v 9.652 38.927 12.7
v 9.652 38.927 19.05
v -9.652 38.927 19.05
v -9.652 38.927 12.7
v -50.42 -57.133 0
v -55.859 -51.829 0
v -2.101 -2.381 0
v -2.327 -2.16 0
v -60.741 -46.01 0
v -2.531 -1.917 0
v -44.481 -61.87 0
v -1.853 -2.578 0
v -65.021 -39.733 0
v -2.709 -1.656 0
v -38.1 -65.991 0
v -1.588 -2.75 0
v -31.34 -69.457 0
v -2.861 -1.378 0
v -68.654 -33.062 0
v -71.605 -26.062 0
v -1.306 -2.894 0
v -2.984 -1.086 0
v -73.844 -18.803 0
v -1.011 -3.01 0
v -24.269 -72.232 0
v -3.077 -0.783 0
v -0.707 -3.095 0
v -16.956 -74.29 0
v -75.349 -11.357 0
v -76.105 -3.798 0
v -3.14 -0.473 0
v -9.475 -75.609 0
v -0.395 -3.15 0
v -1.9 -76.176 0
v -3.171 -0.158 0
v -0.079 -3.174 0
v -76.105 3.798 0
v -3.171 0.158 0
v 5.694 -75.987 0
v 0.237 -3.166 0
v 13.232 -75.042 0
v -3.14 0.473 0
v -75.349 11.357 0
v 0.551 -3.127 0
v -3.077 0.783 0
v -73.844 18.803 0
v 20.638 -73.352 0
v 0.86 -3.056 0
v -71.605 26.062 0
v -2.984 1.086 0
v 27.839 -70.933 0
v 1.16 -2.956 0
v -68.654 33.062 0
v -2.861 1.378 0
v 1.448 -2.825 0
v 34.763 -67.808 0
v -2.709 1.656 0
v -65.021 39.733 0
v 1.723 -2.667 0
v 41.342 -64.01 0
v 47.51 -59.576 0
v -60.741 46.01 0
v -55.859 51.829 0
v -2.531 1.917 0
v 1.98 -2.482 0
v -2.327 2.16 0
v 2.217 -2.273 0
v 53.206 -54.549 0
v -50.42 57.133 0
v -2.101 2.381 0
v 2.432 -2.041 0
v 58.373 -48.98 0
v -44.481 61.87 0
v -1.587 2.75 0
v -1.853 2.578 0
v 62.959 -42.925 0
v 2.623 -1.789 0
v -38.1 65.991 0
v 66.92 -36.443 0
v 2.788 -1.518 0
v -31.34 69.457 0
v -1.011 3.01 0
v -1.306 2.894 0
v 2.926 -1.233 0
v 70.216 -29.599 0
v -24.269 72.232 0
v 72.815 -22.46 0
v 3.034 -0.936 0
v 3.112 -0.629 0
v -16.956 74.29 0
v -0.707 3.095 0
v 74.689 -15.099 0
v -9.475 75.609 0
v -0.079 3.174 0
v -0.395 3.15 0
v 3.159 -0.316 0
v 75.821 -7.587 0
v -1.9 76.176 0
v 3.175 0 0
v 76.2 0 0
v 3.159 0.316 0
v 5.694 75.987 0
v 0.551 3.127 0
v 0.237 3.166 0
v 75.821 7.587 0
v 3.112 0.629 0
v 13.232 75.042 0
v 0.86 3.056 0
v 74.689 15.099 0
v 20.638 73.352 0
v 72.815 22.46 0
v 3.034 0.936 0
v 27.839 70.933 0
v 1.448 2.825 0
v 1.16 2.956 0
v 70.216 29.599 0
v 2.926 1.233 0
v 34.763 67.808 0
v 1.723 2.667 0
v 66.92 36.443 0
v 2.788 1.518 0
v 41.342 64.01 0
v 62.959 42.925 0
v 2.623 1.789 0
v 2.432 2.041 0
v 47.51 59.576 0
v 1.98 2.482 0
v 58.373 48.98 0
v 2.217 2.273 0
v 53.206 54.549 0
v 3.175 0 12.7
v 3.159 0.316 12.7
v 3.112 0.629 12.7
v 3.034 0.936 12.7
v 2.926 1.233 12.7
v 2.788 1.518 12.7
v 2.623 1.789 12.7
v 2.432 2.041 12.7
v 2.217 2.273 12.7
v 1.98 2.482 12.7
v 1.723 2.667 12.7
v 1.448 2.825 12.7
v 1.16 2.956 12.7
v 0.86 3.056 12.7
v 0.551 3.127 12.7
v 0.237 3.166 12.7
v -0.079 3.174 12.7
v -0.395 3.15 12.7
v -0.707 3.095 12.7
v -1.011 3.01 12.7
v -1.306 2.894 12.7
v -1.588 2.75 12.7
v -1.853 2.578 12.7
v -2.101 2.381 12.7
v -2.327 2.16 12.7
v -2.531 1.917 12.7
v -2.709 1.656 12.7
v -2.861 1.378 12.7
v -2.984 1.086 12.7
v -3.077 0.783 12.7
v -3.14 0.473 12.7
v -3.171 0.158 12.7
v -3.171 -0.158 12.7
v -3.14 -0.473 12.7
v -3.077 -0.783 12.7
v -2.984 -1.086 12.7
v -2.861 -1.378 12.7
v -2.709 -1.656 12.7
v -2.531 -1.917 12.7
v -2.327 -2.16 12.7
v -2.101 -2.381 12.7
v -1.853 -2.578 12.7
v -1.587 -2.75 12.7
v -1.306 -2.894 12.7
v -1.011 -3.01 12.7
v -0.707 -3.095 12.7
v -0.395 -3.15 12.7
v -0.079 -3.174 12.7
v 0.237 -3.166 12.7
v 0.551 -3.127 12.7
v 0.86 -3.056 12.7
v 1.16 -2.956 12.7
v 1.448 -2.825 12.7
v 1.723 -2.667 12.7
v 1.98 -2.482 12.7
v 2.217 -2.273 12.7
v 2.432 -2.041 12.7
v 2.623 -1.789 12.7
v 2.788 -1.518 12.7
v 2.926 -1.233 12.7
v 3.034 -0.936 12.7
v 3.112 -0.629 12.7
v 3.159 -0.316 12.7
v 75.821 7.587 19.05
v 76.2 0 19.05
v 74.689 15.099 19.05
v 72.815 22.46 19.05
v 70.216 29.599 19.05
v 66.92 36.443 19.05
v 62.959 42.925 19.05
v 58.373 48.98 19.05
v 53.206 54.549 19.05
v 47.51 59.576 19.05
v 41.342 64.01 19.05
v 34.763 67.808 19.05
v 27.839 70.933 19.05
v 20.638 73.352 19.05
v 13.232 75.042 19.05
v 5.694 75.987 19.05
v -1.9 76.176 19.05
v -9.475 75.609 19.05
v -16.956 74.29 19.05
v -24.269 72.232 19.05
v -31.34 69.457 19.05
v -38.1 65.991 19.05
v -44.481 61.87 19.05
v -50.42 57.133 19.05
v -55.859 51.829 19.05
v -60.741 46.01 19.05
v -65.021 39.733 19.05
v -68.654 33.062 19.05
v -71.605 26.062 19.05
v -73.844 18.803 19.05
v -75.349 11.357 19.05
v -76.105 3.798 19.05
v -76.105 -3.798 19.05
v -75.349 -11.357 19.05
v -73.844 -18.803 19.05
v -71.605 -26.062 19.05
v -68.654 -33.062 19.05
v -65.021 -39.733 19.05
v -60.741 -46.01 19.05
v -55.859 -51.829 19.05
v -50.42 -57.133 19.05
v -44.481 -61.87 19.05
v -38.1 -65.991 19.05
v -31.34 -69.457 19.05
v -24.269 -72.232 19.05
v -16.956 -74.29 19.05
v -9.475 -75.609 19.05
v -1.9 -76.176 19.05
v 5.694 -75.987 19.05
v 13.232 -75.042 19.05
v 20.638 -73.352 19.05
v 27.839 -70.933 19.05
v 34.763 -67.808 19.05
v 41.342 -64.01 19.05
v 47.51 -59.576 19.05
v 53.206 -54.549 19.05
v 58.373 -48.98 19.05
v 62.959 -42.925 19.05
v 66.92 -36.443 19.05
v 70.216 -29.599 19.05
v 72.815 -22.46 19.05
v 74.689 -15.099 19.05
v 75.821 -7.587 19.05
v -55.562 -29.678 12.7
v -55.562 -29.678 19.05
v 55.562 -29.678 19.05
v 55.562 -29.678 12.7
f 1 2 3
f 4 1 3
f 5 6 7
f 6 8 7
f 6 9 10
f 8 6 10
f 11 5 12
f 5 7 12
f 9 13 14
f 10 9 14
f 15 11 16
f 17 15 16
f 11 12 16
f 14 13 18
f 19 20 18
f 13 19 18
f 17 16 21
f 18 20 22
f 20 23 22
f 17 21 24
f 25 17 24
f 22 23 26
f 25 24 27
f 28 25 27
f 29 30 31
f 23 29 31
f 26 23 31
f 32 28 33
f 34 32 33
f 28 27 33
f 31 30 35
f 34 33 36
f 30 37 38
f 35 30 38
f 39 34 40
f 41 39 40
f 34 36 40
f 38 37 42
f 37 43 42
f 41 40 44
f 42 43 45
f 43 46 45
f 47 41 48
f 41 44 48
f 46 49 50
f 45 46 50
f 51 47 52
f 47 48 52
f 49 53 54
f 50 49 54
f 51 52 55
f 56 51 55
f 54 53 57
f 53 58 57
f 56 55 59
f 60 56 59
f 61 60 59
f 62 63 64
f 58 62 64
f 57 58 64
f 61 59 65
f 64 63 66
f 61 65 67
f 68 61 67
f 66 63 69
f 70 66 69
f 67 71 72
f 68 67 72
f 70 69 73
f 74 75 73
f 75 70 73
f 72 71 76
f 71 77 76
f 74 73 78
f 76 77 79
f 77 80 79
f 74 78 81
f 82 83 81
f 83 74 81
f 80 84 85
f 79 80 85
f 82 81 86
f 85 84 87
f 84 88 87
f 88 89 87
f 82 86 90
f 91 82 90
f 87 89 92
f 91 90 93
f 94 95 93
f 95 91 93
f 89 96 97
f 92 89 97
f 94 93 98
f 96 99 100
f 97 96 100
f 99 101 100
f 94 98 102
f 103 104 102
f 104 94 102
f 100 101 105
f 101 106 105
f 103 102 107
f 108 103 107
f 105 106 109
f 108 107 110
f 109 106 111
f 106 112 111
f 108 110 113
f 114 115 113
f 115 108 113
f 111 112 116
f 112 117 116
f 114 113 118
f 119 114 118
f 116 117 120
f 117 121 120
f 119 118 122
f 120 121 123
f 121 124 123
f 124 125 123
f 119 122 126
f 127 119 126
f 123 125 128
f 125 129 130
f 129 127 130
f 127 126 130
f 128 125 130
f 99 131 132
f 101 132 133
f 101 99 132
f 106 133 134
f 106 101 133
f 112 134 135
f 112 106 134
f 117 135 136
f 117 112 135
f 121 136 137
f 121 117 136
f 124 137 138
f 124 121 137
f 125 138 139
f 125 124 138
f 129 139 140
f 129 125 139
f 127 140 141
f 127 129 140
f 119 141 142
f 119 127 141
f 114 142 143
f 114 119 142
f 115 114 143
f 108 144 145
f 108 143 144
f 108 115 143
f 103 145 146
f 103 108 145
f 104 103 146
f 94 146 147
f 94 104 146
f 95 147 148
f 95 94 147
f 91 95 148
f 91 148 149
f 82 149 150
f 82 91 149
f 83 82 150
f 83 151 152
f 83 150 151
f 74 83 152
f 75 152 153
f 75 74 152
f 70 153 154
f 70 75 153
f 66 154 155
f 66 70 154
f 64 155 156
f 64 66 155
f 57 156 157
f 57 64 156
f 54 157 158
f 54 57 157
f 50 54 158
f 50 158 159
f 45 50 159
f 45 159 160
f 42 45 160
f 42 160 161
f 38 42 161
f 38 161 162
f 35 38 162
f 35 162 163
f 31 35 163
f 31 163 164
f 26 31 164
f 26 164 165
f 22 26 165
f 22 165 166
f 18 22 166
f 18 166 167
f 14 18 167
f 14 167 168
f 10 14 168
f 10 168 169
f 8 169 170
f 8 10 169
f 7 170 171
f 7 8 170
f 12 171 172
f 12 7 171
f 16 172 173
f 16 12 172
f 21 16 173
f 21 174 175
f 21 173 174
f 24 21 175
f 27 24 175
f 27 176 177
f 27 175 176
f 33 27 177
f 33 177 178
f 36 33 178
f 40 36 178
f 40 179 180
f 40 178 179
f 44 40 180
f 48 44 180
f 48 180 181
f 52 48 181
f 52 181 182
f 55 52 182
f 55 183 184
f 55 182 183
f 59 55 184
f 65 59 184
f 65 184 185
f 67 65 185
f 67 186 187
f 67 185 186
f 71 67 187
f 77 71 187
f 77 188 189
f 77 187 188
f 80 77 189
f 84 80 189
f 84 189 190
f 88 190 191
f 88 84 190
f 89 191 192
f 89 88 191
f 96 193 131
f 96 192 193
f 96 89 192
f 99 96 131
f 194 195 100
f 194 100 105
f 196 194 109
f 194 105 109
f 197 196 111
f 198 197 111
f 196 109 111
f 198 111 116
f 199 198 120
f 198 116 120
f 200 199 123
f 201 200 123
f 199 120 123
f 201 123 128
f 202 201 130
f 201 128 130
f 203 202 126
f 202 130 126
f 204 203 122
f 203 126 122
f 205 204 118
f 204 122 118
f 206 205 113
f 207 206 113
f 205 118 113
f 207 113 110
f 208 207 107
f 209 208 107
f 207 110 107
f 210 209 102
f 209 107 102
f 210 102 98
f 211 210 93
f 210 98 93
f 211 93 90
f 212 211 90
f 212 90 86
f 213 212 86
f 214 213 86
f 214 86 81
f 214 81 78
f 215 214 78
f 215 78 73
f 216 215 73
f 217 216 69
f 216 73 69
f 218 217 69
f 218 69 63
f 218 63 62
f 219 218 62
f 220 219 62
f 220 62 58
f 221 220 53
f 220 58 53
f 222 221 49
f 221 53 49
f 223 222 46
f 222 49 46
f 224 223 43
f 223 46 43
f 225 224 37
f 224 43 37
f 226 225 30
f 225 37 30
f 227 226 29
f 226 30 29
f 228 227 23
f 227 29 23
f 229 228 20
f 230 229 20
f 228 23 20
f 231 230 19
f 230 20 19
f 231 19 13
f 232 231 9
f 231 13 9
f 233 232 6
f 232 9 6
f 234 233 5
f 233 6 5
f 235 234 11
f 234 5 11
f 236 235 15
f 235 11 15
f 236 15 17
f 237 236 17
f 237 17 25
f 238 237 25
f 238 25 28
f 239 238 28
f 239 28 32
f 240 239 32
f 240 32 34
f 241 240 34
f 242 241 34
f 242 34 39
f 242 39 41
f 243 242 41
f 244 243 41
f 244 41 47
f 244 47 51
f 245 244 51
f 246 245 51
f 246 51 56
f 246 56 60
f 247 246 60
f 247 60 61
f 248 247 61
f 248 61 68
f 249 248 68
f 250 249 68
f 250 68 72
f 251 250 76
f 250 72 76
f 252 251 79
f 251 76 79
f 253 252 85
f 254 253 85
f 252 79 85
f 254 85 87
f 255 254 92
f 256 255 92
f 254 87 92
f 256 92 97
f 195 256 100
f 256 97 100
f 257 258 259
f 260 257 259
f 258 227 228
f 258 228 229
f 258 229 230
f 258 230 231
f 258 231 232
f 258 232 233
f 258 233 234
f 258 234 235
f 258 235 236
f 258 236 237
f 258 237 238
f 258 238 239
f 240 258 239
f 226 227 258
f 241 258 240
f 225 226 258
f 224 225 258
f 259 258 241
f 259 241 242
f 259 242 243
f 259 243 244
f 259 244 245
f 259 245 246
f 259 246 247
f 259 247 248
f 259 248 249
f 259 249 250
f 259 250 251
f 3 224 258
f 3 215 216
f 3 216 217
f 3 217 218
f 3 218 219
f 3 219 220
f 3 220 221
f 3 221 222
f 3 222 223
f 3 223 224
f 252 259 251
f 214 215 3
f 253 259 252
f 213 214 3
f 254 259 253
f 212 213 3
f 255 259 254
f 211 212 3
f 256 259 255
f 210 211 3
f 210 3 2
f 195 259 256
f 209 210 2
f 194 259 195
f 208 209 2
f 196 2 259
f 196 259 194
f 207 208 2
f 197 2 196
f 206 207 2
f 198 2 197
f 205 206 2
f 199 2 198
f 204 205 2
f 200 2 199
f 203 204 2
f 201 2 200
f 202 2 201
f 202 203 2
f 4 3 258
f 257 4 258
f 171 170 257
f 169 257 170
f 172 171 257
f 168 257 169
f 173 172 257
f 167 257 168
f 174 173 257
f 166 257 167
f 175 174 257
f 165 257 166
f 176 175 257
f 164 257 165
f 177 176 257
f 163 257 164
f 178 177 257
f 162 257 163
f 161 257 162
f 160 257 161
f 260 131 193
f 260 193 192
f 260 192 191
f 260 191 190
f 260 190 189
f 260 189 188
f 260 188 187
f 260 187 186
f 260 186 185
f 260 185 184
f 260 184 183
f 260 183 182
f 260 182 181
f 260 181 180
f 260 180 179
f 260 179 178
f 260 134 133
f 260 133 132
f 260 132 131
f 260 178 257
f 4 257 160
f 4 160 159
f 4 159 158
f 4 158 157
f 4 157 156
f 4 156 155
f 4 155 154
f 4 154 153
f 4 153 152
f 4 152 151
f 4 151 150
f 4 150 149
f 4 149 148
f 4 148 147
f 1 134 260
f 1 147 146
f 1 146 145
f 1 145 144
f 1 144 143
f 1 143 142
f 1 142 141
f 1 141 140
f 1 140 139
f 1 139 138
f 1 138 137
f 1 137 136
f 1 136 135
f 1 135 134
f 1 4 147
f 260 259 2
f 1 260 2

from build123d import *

# Parameters (mm, degrees)
F0_R     = 76.2
F0_R_2   = 3.175
F1_DEPTH = 19.05
F3_DEPTH = 6.35


with BuildPart() as f1:
    # F0 (on Top) → F1 (new body)
    with BuildSketch(Plane.XY):
        Circle(F0_R)
        Circle(F0_R_2, mode=Mode.SUBTRACT)
    extrude(amount=F1_DEPTH)

    # F2 (on face) → F3 (cut)
    with BuildSketch(Plane.XY.offset(19.05)):
        Polygon((9.652, 38.927315), (-9.652, 38.927315), (-55.5625, -29.678286), (55.5625, -29.678286), align=None)
    extrude(amount=-F3_DEPTH, mode=Mode.SUBTRACT)


solid = f1.part
